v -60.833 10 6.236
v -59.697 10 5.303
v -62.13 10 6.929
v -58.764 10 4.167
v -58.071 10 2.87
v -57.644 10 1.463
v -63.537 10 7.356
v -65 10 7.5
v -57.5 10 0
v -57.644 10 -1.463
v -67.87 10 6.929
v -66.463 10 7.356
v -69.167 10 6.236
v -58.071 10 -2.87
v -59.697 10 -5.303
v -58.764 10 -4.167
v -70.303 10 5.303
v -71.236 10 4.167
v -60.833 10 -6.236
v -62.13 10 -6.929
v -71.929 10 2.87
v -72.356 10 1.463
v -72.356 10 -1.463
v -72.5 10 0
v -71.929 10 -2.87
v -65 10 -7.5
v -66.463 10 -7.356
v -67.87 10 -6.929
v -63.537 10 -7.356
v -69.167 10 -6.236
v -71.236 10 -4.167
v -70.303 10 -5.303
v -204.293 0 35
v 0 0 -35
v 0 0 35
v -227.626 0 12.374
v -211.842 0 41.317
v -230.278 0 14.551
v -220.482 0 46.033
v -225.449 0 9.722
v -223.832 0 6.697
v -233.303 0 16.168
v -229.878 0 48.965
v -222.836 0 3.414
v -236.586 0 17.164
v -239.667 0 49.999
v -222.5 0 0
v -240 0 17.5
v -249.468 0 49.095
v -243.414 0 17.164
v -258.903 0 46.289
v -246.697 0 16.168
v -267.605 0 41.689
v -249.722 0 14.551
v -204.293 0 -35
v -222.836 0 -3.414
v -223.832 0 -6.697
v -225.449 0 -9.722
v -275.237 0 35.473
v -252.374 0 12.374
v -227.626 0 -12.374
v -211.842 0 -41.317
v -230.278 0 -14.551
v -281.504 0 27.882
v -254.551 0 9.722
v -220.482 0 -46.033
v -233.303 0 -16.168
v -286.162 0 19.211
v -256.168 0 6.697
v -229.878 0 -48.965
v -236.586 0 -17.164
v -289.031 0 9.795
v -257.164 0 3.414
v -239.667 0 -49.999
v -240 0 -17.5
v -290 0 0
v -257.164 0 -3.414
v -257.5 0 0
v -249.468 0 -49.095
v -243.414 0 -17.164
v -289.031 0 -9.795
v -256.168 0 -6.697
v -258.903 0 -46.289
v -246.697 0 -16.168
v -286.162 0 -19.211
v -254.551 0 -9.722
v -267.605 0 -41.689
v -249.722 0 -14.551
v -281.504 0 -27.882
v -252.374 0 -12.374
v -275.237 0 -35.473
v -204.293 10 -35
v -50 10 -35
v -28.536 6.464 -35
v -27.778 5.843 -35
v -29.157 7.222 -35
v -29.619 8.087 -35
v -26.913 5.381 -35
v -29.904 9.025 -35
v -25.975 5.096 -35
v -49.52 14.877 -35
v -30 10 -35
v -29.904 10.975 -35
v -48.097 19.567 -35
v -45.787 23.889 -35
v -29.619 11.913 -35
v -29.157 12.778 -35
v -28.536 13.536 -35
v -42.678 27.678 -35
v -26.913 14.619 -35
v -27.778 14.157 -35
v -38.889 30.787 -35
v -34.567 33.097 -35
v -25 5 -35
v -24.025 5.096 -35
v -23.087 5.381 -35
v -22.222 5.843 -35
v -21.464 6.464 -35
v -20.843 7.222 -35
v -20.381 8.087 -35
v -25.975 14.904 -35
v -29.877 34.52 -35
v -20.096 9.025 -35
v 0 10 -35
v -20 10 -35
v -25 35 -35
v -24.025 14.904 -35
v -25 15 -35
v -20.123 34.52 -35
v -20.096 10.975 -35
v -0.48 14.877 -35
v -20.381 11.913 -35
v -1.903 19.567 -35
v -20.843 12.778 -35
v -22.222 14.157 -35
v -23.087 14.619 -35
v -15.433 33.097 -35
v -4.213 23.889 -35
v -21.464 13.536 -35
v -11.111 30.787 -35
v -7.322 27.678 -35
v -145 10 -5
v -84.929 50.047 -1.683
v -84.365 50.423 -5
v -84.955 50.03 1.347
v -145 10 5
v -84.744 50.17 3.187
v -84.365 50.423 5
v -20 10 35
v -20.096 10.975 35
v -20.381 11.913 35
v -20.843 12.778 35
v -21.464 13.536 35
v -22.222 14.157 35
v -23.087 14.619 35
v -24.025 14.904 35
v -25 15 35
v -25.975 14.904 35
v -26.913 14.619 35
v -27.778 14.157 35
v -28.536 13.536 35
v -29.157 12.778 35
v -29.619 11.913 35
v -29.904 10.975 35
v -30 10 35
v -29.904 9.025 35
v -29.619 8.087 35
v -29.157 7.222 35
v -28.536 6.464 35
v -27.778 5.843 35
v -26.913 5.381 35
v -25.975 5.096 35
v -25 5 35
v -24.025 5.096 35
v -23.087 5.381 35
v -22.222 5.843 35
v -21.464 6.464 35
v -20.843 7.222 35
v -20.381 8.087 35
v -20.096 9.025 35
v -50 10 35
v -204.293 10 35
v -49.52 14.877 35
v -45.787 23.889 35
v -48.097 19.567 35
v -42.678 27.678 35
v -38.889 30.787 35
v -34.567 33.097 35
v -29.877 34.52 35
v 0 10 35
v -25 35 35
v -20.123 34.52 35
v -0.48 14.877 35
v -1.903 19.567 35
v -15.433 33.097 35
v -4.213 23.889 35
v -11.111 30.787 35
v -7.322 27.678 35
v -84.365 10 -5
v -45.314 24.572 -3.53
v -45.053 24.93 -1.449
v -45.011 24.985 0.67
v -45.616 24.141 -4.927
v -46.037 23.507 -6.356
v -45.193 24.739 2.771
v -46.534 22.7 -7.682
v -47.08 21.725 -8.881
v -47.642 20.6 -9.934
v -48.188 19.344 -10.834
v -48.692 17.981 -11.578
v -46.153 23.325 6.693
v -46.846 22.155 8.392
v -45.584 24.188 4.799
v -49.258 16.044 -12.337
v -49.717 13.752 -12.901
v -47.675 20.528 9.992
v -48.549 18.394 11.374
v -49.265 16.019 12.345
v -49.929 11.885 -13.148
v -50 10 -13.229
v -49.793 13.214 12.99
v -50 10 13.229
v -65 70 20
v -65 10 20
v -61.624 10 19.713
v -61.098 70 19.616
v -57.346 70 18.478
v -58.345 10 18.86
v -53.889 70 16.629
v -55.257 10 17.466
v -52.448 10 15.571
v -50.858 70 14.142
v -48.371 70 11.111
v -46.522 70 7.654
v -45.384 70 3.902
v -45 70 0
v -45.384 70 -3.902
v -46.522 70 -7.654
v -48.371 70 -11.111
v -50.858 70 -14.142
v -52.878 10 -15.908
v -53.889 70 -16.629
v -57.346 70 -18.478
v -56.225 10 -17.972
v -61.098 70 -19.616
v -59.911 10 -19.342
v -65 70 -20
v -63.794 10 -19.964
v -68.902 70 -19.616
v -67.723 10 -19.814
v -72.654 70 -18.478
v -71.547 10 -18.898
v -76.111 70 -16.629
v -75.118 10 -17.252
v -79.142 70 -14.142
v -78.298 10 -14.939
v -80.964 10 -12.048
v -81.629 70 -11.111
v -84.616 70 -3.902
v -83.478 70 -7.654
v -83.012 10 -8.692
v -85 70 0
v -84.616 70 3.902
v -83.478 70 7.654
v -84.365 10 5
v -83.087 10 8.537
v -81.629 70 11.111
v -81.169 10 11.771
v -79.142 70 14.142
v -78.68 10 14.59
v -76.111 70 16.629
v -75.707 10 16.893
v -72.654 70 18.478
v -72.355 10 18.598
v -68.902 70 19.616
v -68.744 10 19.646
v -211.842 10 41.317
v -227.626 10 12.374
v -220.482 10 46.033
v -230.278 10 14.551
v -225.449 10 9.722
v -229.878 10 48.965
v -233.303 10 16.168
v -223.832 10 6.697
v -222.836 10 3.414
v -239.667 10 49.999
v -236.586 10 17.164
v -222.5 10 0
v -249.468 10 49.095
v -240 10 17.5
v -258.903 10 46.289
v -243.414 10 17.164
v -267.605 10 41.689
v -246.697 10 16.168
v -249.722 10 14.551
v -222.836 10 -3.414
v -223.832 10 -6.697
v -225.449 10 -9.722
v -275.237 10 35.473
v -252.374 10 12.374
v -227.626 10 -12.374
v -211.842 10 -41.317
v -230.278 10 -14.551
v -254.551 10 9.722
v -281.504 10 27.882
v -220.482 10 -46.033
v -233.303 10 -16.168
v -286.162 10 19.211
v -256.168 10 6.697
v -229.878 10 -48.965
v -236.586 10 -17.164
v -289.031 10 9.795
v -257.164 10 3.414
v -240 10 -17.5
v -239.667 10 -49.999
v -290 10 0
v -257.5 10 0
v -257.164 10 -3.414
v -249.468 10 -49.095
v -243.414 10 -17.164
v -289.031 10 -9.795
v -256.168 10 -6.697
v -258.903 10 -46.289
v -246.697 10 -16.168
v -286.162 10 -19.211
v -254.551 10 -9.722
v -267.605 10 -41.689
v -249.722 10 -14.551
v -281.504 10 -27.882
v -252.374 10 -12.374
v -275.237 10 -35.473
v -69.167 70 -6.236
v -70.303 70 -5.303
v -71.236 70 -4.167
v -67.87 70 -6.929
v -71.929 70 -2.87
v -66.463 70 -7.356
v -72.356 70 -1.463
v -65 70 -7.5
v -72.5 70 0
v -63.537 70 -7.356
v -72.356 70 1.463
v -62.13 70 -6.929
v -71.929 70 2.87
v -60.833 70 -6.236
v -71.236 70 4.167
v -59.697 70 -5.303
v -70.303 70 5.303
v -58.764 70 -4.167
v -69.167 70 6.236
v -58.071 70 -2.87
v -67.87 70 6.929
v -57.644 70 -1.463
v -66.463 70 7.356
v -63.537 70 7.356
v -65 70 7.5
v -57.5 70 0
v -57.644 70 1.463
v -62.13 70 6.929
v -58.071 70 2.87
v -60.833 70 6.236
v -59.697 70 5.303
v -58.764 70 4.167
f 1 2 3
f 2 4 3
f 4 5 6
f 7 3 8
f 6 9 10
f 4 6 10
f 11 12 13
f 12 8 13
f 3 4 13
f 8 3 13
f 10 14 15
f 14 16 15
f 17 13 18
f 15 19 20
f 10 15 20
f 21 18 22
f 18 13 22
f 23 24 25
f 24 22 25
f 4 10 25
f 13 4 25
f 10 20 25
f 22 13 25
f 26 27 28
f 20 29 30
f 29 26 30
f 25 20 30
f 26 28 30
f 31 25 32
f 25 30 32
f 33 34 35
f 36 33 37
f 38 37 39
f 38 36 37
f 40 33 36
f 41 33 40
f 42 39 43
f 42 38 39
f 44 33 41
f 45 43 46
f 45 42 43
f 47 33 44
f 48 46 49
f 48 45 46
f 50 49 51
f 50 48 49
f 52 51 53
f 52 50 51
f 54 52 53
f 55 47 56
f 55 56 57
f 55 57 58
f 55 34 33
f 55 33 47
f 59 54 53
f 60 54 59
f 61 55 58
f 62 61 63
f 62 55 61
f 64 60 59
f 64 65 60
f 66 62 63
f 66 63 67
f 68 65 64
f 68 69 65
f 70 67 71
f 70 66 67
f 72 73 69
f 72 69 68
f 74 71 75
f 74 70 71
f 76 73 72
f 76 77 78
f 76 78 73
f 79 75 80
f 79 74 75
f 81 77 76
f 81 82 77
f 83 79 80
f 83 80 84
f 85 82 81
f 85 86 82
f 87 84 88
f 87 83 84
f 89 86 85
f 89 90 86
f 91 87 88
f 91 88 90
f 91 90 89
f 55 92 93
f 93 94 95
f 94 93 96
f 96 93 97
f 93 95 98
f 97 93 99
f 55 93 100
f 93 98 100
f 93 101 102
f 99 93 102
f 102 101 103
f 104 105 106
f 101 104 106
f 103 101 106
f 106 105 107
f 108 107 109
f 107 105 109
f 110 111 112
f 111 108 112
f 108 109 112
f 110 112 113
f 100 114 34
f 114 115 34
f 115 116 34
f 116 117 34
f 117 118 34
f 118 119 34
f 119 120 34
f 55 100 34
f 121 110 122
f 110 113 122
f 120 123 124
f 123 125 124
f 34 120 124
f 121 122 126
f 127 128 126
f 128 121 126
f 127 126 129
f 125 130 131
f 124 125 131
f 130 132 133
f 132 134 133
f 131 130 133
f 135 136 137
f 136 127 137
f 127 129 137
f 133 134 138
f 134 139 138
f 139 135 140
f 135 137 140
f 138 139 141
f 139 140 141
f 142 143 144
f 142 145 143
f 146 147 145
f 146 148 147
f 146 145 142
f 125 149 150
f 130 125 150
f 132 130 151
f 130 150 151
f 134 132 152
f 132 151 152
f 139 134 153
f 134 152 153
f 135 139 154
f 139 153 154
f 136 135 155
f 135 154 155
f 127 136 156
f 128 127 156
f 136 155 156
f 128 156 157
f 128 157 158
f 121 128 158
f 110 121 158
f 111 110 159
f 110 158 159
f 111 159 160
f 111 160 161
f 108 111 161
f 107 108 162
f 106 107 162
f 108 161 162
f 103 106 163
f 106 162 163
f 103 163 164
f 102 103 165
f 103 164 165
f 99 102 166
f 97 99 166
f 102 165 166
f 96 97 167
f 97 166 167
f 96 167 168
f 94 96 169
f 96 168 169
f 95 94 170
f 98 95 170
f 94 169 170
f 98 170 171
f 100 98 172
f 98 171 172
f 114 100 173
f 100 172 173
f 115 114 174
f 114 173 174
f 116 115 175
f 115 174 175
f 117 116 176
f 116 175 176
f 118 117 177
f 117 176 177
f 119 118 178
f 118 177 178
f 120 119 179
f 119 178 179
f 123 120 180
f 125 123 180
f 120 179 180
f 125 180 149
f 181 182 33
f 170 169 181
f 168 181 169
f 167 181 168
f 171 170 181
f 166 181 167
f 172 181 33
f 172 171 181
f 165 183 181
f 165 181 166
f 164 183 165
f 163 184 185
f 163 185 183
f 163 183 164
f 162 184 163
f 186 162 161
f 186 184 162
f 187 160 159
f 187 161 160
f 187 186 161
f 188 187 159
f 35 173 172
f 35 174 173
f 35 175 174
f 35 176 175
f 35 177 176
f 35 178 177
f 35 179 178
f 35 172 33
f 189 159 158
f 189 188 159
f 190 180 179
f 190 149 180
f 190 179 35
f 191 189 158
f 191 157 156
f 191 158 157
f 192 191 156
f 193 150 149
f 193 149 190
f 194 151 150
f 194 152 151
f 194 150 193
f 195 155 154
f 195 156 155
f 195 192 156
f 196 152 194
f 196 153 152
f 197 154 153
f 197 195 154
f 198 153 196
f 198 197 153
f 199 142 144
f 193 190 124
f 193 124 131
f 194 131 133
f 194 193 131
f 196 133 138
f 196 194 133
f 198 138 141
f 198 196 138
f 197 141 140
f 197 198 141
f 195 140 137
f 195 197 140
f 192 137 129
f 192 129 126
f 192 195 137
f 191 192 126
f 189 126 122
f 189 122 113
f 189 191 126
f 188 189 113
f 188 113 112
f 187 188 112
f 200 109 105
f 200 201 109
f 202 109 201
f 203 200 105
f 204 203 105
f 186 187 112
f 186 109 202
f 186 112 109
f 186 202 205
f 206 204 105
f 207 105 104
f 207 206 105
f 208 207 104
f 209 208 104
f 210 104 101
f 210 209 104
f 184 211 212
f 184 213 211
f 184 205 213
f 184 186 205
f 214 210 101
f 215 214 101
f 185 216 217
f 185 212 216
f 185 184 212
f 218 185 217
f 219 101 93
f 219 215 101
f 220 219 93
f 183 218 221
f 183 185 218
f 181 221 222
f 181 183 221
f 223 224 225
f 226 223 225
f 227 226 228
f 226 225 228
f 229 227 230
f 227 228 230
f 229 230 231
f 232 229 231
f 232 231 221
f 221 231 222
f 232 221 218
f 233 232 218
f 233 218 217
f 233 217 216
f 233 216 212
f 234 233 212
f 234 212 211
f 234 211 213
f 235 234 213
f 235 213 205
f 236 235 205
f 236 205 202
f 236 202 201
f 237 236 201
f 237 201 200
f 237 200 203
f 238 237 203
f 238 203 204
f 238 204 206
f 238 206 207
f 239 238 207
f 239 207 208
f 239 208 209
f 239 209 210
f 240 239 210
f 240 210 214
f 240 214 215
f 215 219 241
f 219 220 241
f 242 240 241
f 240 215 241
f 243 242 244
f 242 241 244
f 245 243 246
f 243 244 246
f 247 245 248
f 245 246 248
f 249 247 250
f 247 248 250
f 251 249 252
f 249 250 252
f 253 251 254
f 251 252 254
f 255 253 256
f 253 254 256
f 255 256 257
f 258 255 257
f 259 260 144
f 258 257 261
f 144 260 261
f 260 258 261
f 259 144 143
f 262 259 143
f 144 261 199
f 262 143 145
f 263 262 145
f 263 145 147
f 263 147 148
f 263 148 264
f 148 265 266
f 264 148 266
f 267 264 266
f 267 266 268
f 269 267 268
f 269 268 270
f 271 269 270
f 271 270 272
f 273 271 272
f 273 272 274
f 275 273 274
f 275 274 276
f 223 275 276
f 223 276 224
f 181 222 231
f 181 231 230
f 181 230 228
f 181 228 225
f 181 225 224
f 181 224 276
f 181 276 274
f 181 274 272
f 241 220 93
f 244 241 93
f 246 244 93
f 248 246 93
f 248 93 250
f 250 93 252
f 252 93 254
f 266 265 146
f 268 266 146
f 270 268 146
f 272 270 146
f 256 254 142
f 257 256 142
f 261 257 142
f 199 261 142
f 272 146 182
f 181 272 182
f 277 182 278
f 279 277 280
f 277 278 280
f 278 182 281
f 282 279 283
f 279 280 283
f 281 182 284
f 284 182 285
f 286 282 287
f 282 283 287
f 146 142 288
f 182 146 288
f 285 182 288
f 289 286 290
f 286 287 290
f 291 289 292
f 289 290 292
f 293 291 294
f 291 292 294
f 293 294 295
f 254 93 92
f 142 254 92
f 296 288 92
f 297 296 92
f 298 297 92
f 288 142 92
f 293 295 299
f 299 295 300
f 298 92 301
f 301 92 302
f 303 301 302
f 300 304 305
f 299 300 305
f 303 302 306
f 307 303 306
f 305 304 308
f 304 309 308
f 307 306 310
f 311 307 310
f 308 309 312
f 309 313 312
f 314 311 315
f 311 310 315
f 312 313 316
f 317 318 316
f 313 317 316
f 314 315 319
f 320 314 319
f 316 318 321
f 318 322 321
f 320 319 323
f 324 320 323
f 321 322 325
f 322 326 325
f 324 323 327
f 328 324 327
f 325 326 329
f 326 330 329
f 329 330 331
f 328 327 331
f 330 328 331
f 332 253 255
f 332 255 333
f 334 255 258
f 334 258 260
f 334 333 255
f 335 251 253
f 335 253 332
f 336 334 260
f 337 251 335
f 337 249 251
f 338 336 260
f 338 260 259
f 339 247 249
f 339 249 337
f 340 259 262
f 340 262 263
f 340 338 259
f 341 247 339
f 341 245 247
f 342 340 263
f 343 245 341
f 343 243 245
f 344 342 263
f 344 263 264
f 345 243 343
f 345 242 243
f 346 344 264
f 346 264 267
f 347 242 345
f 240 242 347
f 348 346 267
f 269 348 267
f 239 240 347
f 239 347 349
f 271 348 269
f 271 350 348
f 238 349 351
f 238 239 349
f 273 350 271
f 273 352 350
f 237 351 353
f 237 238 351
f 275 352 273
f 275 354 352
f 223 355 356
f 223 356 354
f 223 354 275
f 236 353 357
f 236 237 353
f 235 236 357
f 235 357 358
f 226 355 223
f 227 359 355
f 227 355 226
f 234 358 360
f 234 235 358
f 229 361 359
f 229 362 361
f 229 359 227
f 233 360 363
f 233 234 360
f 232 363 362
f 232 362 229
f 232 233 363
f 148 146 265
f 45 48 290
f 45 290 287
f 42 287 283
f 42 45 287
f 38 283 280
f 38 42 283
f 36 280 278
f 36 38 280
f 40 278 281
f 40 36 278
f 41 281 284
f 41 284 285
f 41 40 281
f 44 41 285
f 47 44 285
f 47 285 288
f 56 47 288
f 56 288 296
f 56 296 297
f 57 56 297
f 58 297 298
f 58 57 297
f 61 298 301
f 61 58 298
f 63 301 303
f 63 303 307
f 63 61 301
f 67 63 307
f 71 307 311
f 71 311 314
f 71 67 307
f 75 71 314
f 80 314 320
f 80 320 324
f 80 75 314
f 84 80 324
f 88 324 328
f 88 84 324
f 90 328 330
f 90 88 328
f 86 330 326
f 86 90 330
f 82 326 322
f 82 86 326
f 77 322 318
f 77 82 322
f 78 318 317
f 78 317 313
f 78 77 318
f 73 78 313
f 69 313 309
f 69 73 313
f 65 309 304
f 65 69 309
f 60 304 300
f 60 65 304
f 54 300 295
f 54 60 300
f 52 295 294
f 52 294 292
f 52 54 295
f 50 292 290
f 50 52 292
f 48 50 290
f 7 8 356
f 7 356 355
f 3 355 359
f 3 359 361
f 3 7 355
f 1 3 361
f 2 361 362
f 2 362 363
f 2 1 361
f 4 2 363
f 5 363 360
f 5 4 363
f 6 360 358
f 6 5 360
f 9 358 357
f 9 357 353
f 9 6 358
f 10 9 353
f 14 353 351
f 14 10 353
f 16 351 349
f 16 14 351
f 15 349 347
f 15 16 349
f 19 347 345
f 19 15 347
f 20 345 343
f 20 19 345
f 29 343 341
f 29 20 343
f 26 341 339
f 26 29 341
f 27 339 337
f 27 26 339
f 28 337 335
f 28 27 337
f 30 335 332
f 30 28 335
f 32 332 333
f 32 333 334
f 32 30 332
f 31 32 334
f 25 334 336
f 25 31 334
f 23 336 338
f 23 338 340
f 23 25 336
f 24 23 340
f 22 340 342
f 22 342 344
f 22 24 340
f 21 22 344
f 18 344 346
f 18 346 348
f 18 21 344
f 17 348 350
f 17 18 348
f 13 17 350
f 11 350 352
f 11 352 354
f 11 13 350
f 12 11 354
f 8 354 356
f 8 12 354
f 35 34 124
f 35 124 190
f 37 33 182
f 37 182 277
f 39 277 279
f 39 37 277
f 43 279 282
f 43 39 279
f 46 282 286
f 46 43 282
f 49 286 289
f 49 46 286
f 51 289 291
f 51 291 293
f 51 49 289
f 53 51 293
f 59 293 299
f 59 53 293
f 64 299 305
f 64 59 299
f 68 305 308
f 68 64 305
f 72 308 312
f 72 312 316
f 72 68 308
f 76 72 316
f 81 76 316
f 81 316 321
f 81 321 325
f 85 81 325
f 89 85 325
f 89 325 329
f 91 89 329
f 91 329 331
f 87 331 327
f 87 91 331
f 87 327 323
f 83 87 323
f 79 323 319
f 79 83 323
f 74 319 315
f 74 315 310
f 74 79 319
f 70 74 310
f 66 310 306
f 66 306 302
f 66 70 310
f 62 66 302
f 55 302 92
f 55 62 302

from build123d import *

# Parameters (mm, degrees)
SKETCH2_R           = 17.5
BOSS_EXTRUDE1_DEPTH = 10
SKETCH3_R           = 20
SKETCH3_R_2         = 7.5
BOSS_EXTRUDE2_DEPTH = 60
BOSS_EXTRUDE7_DEPTH = 5
BOSS_EXTRUDE8_DEPTH = 35
SKETCH5_R           = 5
CUT_EXTRUDE1_DEPTH  = 70


with BuildPart() as part:
    # Sketch2 → Boss-Extrude1 (new body)
    with BuildSketch(Plane(origin=(0, 0, 0), x_dir=(1, 0, 0), z_dir=(0, 1, 0))):
        with BuildLine():
            Line((0, -35), (-204.292857857, -35))
            ThreePointArc((-204.292857857, -35), (-290, 0), (-204.292857857, 35))
            Line((-204.292857857, 35), (0, 35))
            Line((0, 35), (0, -35))
        make_face()
        with Locations((-240, 0)):
            Circle(SKETCH2_R, mode=Mode.SUBTRACT)
    extrude(amount=BOSS_EXTRUDE1_DEPTH)

    # Sketch3 → Boss-Extrude2 (add)
    with BuildSketch(Plane(origin=(0, 10, 0), x_dir=(1, 0, 0), z_dir=(0, 1, 0))):
        with Locations((-65, 0)):
            Circle(SKETCH3_R)
        with Locations((-65, 0)):
            Circle(SKETCH3_R_2, mode=Mode.SUBTRACT)
    extrude(amount=BOSS_EXTRUDE2_DEPTH)

    # Sketch4 → Boss-Extrude7 (add, symmetric)
    with BuildSketch(Plane.XY):
        Polygon((-81.055755384, 10), (-81.055755384, 52.629496411), (-145, 10), align=None)
    extrude(amount=BOSS_EXTRUDE7_DEPTH, both=True)

    # Sketch4<6> → Boss-Extrude8 (add, symmetric)
    with BuildSketch(Plane.XY):
        with BuildLine():
            ThreePointArc((0, 10), (-25, 35), (-50, 10))
            Line((-50, 10), (0, 10))
        make_face()
    extrude(amount=BOSS_EXTRUDE8_DEPTH, both=True)

    # Sketch5 → Cut-Extrude1 (cut)
    with BuildSketch(Plane.XY.offset(35)):
        with Locations((-25, 10)):
            Circle(SKETCH5_R)
    extrude(amount=-CUT_EXTRUDE1_DEPTH, mode=Mode.SUBTRACT)


solid = part.part
